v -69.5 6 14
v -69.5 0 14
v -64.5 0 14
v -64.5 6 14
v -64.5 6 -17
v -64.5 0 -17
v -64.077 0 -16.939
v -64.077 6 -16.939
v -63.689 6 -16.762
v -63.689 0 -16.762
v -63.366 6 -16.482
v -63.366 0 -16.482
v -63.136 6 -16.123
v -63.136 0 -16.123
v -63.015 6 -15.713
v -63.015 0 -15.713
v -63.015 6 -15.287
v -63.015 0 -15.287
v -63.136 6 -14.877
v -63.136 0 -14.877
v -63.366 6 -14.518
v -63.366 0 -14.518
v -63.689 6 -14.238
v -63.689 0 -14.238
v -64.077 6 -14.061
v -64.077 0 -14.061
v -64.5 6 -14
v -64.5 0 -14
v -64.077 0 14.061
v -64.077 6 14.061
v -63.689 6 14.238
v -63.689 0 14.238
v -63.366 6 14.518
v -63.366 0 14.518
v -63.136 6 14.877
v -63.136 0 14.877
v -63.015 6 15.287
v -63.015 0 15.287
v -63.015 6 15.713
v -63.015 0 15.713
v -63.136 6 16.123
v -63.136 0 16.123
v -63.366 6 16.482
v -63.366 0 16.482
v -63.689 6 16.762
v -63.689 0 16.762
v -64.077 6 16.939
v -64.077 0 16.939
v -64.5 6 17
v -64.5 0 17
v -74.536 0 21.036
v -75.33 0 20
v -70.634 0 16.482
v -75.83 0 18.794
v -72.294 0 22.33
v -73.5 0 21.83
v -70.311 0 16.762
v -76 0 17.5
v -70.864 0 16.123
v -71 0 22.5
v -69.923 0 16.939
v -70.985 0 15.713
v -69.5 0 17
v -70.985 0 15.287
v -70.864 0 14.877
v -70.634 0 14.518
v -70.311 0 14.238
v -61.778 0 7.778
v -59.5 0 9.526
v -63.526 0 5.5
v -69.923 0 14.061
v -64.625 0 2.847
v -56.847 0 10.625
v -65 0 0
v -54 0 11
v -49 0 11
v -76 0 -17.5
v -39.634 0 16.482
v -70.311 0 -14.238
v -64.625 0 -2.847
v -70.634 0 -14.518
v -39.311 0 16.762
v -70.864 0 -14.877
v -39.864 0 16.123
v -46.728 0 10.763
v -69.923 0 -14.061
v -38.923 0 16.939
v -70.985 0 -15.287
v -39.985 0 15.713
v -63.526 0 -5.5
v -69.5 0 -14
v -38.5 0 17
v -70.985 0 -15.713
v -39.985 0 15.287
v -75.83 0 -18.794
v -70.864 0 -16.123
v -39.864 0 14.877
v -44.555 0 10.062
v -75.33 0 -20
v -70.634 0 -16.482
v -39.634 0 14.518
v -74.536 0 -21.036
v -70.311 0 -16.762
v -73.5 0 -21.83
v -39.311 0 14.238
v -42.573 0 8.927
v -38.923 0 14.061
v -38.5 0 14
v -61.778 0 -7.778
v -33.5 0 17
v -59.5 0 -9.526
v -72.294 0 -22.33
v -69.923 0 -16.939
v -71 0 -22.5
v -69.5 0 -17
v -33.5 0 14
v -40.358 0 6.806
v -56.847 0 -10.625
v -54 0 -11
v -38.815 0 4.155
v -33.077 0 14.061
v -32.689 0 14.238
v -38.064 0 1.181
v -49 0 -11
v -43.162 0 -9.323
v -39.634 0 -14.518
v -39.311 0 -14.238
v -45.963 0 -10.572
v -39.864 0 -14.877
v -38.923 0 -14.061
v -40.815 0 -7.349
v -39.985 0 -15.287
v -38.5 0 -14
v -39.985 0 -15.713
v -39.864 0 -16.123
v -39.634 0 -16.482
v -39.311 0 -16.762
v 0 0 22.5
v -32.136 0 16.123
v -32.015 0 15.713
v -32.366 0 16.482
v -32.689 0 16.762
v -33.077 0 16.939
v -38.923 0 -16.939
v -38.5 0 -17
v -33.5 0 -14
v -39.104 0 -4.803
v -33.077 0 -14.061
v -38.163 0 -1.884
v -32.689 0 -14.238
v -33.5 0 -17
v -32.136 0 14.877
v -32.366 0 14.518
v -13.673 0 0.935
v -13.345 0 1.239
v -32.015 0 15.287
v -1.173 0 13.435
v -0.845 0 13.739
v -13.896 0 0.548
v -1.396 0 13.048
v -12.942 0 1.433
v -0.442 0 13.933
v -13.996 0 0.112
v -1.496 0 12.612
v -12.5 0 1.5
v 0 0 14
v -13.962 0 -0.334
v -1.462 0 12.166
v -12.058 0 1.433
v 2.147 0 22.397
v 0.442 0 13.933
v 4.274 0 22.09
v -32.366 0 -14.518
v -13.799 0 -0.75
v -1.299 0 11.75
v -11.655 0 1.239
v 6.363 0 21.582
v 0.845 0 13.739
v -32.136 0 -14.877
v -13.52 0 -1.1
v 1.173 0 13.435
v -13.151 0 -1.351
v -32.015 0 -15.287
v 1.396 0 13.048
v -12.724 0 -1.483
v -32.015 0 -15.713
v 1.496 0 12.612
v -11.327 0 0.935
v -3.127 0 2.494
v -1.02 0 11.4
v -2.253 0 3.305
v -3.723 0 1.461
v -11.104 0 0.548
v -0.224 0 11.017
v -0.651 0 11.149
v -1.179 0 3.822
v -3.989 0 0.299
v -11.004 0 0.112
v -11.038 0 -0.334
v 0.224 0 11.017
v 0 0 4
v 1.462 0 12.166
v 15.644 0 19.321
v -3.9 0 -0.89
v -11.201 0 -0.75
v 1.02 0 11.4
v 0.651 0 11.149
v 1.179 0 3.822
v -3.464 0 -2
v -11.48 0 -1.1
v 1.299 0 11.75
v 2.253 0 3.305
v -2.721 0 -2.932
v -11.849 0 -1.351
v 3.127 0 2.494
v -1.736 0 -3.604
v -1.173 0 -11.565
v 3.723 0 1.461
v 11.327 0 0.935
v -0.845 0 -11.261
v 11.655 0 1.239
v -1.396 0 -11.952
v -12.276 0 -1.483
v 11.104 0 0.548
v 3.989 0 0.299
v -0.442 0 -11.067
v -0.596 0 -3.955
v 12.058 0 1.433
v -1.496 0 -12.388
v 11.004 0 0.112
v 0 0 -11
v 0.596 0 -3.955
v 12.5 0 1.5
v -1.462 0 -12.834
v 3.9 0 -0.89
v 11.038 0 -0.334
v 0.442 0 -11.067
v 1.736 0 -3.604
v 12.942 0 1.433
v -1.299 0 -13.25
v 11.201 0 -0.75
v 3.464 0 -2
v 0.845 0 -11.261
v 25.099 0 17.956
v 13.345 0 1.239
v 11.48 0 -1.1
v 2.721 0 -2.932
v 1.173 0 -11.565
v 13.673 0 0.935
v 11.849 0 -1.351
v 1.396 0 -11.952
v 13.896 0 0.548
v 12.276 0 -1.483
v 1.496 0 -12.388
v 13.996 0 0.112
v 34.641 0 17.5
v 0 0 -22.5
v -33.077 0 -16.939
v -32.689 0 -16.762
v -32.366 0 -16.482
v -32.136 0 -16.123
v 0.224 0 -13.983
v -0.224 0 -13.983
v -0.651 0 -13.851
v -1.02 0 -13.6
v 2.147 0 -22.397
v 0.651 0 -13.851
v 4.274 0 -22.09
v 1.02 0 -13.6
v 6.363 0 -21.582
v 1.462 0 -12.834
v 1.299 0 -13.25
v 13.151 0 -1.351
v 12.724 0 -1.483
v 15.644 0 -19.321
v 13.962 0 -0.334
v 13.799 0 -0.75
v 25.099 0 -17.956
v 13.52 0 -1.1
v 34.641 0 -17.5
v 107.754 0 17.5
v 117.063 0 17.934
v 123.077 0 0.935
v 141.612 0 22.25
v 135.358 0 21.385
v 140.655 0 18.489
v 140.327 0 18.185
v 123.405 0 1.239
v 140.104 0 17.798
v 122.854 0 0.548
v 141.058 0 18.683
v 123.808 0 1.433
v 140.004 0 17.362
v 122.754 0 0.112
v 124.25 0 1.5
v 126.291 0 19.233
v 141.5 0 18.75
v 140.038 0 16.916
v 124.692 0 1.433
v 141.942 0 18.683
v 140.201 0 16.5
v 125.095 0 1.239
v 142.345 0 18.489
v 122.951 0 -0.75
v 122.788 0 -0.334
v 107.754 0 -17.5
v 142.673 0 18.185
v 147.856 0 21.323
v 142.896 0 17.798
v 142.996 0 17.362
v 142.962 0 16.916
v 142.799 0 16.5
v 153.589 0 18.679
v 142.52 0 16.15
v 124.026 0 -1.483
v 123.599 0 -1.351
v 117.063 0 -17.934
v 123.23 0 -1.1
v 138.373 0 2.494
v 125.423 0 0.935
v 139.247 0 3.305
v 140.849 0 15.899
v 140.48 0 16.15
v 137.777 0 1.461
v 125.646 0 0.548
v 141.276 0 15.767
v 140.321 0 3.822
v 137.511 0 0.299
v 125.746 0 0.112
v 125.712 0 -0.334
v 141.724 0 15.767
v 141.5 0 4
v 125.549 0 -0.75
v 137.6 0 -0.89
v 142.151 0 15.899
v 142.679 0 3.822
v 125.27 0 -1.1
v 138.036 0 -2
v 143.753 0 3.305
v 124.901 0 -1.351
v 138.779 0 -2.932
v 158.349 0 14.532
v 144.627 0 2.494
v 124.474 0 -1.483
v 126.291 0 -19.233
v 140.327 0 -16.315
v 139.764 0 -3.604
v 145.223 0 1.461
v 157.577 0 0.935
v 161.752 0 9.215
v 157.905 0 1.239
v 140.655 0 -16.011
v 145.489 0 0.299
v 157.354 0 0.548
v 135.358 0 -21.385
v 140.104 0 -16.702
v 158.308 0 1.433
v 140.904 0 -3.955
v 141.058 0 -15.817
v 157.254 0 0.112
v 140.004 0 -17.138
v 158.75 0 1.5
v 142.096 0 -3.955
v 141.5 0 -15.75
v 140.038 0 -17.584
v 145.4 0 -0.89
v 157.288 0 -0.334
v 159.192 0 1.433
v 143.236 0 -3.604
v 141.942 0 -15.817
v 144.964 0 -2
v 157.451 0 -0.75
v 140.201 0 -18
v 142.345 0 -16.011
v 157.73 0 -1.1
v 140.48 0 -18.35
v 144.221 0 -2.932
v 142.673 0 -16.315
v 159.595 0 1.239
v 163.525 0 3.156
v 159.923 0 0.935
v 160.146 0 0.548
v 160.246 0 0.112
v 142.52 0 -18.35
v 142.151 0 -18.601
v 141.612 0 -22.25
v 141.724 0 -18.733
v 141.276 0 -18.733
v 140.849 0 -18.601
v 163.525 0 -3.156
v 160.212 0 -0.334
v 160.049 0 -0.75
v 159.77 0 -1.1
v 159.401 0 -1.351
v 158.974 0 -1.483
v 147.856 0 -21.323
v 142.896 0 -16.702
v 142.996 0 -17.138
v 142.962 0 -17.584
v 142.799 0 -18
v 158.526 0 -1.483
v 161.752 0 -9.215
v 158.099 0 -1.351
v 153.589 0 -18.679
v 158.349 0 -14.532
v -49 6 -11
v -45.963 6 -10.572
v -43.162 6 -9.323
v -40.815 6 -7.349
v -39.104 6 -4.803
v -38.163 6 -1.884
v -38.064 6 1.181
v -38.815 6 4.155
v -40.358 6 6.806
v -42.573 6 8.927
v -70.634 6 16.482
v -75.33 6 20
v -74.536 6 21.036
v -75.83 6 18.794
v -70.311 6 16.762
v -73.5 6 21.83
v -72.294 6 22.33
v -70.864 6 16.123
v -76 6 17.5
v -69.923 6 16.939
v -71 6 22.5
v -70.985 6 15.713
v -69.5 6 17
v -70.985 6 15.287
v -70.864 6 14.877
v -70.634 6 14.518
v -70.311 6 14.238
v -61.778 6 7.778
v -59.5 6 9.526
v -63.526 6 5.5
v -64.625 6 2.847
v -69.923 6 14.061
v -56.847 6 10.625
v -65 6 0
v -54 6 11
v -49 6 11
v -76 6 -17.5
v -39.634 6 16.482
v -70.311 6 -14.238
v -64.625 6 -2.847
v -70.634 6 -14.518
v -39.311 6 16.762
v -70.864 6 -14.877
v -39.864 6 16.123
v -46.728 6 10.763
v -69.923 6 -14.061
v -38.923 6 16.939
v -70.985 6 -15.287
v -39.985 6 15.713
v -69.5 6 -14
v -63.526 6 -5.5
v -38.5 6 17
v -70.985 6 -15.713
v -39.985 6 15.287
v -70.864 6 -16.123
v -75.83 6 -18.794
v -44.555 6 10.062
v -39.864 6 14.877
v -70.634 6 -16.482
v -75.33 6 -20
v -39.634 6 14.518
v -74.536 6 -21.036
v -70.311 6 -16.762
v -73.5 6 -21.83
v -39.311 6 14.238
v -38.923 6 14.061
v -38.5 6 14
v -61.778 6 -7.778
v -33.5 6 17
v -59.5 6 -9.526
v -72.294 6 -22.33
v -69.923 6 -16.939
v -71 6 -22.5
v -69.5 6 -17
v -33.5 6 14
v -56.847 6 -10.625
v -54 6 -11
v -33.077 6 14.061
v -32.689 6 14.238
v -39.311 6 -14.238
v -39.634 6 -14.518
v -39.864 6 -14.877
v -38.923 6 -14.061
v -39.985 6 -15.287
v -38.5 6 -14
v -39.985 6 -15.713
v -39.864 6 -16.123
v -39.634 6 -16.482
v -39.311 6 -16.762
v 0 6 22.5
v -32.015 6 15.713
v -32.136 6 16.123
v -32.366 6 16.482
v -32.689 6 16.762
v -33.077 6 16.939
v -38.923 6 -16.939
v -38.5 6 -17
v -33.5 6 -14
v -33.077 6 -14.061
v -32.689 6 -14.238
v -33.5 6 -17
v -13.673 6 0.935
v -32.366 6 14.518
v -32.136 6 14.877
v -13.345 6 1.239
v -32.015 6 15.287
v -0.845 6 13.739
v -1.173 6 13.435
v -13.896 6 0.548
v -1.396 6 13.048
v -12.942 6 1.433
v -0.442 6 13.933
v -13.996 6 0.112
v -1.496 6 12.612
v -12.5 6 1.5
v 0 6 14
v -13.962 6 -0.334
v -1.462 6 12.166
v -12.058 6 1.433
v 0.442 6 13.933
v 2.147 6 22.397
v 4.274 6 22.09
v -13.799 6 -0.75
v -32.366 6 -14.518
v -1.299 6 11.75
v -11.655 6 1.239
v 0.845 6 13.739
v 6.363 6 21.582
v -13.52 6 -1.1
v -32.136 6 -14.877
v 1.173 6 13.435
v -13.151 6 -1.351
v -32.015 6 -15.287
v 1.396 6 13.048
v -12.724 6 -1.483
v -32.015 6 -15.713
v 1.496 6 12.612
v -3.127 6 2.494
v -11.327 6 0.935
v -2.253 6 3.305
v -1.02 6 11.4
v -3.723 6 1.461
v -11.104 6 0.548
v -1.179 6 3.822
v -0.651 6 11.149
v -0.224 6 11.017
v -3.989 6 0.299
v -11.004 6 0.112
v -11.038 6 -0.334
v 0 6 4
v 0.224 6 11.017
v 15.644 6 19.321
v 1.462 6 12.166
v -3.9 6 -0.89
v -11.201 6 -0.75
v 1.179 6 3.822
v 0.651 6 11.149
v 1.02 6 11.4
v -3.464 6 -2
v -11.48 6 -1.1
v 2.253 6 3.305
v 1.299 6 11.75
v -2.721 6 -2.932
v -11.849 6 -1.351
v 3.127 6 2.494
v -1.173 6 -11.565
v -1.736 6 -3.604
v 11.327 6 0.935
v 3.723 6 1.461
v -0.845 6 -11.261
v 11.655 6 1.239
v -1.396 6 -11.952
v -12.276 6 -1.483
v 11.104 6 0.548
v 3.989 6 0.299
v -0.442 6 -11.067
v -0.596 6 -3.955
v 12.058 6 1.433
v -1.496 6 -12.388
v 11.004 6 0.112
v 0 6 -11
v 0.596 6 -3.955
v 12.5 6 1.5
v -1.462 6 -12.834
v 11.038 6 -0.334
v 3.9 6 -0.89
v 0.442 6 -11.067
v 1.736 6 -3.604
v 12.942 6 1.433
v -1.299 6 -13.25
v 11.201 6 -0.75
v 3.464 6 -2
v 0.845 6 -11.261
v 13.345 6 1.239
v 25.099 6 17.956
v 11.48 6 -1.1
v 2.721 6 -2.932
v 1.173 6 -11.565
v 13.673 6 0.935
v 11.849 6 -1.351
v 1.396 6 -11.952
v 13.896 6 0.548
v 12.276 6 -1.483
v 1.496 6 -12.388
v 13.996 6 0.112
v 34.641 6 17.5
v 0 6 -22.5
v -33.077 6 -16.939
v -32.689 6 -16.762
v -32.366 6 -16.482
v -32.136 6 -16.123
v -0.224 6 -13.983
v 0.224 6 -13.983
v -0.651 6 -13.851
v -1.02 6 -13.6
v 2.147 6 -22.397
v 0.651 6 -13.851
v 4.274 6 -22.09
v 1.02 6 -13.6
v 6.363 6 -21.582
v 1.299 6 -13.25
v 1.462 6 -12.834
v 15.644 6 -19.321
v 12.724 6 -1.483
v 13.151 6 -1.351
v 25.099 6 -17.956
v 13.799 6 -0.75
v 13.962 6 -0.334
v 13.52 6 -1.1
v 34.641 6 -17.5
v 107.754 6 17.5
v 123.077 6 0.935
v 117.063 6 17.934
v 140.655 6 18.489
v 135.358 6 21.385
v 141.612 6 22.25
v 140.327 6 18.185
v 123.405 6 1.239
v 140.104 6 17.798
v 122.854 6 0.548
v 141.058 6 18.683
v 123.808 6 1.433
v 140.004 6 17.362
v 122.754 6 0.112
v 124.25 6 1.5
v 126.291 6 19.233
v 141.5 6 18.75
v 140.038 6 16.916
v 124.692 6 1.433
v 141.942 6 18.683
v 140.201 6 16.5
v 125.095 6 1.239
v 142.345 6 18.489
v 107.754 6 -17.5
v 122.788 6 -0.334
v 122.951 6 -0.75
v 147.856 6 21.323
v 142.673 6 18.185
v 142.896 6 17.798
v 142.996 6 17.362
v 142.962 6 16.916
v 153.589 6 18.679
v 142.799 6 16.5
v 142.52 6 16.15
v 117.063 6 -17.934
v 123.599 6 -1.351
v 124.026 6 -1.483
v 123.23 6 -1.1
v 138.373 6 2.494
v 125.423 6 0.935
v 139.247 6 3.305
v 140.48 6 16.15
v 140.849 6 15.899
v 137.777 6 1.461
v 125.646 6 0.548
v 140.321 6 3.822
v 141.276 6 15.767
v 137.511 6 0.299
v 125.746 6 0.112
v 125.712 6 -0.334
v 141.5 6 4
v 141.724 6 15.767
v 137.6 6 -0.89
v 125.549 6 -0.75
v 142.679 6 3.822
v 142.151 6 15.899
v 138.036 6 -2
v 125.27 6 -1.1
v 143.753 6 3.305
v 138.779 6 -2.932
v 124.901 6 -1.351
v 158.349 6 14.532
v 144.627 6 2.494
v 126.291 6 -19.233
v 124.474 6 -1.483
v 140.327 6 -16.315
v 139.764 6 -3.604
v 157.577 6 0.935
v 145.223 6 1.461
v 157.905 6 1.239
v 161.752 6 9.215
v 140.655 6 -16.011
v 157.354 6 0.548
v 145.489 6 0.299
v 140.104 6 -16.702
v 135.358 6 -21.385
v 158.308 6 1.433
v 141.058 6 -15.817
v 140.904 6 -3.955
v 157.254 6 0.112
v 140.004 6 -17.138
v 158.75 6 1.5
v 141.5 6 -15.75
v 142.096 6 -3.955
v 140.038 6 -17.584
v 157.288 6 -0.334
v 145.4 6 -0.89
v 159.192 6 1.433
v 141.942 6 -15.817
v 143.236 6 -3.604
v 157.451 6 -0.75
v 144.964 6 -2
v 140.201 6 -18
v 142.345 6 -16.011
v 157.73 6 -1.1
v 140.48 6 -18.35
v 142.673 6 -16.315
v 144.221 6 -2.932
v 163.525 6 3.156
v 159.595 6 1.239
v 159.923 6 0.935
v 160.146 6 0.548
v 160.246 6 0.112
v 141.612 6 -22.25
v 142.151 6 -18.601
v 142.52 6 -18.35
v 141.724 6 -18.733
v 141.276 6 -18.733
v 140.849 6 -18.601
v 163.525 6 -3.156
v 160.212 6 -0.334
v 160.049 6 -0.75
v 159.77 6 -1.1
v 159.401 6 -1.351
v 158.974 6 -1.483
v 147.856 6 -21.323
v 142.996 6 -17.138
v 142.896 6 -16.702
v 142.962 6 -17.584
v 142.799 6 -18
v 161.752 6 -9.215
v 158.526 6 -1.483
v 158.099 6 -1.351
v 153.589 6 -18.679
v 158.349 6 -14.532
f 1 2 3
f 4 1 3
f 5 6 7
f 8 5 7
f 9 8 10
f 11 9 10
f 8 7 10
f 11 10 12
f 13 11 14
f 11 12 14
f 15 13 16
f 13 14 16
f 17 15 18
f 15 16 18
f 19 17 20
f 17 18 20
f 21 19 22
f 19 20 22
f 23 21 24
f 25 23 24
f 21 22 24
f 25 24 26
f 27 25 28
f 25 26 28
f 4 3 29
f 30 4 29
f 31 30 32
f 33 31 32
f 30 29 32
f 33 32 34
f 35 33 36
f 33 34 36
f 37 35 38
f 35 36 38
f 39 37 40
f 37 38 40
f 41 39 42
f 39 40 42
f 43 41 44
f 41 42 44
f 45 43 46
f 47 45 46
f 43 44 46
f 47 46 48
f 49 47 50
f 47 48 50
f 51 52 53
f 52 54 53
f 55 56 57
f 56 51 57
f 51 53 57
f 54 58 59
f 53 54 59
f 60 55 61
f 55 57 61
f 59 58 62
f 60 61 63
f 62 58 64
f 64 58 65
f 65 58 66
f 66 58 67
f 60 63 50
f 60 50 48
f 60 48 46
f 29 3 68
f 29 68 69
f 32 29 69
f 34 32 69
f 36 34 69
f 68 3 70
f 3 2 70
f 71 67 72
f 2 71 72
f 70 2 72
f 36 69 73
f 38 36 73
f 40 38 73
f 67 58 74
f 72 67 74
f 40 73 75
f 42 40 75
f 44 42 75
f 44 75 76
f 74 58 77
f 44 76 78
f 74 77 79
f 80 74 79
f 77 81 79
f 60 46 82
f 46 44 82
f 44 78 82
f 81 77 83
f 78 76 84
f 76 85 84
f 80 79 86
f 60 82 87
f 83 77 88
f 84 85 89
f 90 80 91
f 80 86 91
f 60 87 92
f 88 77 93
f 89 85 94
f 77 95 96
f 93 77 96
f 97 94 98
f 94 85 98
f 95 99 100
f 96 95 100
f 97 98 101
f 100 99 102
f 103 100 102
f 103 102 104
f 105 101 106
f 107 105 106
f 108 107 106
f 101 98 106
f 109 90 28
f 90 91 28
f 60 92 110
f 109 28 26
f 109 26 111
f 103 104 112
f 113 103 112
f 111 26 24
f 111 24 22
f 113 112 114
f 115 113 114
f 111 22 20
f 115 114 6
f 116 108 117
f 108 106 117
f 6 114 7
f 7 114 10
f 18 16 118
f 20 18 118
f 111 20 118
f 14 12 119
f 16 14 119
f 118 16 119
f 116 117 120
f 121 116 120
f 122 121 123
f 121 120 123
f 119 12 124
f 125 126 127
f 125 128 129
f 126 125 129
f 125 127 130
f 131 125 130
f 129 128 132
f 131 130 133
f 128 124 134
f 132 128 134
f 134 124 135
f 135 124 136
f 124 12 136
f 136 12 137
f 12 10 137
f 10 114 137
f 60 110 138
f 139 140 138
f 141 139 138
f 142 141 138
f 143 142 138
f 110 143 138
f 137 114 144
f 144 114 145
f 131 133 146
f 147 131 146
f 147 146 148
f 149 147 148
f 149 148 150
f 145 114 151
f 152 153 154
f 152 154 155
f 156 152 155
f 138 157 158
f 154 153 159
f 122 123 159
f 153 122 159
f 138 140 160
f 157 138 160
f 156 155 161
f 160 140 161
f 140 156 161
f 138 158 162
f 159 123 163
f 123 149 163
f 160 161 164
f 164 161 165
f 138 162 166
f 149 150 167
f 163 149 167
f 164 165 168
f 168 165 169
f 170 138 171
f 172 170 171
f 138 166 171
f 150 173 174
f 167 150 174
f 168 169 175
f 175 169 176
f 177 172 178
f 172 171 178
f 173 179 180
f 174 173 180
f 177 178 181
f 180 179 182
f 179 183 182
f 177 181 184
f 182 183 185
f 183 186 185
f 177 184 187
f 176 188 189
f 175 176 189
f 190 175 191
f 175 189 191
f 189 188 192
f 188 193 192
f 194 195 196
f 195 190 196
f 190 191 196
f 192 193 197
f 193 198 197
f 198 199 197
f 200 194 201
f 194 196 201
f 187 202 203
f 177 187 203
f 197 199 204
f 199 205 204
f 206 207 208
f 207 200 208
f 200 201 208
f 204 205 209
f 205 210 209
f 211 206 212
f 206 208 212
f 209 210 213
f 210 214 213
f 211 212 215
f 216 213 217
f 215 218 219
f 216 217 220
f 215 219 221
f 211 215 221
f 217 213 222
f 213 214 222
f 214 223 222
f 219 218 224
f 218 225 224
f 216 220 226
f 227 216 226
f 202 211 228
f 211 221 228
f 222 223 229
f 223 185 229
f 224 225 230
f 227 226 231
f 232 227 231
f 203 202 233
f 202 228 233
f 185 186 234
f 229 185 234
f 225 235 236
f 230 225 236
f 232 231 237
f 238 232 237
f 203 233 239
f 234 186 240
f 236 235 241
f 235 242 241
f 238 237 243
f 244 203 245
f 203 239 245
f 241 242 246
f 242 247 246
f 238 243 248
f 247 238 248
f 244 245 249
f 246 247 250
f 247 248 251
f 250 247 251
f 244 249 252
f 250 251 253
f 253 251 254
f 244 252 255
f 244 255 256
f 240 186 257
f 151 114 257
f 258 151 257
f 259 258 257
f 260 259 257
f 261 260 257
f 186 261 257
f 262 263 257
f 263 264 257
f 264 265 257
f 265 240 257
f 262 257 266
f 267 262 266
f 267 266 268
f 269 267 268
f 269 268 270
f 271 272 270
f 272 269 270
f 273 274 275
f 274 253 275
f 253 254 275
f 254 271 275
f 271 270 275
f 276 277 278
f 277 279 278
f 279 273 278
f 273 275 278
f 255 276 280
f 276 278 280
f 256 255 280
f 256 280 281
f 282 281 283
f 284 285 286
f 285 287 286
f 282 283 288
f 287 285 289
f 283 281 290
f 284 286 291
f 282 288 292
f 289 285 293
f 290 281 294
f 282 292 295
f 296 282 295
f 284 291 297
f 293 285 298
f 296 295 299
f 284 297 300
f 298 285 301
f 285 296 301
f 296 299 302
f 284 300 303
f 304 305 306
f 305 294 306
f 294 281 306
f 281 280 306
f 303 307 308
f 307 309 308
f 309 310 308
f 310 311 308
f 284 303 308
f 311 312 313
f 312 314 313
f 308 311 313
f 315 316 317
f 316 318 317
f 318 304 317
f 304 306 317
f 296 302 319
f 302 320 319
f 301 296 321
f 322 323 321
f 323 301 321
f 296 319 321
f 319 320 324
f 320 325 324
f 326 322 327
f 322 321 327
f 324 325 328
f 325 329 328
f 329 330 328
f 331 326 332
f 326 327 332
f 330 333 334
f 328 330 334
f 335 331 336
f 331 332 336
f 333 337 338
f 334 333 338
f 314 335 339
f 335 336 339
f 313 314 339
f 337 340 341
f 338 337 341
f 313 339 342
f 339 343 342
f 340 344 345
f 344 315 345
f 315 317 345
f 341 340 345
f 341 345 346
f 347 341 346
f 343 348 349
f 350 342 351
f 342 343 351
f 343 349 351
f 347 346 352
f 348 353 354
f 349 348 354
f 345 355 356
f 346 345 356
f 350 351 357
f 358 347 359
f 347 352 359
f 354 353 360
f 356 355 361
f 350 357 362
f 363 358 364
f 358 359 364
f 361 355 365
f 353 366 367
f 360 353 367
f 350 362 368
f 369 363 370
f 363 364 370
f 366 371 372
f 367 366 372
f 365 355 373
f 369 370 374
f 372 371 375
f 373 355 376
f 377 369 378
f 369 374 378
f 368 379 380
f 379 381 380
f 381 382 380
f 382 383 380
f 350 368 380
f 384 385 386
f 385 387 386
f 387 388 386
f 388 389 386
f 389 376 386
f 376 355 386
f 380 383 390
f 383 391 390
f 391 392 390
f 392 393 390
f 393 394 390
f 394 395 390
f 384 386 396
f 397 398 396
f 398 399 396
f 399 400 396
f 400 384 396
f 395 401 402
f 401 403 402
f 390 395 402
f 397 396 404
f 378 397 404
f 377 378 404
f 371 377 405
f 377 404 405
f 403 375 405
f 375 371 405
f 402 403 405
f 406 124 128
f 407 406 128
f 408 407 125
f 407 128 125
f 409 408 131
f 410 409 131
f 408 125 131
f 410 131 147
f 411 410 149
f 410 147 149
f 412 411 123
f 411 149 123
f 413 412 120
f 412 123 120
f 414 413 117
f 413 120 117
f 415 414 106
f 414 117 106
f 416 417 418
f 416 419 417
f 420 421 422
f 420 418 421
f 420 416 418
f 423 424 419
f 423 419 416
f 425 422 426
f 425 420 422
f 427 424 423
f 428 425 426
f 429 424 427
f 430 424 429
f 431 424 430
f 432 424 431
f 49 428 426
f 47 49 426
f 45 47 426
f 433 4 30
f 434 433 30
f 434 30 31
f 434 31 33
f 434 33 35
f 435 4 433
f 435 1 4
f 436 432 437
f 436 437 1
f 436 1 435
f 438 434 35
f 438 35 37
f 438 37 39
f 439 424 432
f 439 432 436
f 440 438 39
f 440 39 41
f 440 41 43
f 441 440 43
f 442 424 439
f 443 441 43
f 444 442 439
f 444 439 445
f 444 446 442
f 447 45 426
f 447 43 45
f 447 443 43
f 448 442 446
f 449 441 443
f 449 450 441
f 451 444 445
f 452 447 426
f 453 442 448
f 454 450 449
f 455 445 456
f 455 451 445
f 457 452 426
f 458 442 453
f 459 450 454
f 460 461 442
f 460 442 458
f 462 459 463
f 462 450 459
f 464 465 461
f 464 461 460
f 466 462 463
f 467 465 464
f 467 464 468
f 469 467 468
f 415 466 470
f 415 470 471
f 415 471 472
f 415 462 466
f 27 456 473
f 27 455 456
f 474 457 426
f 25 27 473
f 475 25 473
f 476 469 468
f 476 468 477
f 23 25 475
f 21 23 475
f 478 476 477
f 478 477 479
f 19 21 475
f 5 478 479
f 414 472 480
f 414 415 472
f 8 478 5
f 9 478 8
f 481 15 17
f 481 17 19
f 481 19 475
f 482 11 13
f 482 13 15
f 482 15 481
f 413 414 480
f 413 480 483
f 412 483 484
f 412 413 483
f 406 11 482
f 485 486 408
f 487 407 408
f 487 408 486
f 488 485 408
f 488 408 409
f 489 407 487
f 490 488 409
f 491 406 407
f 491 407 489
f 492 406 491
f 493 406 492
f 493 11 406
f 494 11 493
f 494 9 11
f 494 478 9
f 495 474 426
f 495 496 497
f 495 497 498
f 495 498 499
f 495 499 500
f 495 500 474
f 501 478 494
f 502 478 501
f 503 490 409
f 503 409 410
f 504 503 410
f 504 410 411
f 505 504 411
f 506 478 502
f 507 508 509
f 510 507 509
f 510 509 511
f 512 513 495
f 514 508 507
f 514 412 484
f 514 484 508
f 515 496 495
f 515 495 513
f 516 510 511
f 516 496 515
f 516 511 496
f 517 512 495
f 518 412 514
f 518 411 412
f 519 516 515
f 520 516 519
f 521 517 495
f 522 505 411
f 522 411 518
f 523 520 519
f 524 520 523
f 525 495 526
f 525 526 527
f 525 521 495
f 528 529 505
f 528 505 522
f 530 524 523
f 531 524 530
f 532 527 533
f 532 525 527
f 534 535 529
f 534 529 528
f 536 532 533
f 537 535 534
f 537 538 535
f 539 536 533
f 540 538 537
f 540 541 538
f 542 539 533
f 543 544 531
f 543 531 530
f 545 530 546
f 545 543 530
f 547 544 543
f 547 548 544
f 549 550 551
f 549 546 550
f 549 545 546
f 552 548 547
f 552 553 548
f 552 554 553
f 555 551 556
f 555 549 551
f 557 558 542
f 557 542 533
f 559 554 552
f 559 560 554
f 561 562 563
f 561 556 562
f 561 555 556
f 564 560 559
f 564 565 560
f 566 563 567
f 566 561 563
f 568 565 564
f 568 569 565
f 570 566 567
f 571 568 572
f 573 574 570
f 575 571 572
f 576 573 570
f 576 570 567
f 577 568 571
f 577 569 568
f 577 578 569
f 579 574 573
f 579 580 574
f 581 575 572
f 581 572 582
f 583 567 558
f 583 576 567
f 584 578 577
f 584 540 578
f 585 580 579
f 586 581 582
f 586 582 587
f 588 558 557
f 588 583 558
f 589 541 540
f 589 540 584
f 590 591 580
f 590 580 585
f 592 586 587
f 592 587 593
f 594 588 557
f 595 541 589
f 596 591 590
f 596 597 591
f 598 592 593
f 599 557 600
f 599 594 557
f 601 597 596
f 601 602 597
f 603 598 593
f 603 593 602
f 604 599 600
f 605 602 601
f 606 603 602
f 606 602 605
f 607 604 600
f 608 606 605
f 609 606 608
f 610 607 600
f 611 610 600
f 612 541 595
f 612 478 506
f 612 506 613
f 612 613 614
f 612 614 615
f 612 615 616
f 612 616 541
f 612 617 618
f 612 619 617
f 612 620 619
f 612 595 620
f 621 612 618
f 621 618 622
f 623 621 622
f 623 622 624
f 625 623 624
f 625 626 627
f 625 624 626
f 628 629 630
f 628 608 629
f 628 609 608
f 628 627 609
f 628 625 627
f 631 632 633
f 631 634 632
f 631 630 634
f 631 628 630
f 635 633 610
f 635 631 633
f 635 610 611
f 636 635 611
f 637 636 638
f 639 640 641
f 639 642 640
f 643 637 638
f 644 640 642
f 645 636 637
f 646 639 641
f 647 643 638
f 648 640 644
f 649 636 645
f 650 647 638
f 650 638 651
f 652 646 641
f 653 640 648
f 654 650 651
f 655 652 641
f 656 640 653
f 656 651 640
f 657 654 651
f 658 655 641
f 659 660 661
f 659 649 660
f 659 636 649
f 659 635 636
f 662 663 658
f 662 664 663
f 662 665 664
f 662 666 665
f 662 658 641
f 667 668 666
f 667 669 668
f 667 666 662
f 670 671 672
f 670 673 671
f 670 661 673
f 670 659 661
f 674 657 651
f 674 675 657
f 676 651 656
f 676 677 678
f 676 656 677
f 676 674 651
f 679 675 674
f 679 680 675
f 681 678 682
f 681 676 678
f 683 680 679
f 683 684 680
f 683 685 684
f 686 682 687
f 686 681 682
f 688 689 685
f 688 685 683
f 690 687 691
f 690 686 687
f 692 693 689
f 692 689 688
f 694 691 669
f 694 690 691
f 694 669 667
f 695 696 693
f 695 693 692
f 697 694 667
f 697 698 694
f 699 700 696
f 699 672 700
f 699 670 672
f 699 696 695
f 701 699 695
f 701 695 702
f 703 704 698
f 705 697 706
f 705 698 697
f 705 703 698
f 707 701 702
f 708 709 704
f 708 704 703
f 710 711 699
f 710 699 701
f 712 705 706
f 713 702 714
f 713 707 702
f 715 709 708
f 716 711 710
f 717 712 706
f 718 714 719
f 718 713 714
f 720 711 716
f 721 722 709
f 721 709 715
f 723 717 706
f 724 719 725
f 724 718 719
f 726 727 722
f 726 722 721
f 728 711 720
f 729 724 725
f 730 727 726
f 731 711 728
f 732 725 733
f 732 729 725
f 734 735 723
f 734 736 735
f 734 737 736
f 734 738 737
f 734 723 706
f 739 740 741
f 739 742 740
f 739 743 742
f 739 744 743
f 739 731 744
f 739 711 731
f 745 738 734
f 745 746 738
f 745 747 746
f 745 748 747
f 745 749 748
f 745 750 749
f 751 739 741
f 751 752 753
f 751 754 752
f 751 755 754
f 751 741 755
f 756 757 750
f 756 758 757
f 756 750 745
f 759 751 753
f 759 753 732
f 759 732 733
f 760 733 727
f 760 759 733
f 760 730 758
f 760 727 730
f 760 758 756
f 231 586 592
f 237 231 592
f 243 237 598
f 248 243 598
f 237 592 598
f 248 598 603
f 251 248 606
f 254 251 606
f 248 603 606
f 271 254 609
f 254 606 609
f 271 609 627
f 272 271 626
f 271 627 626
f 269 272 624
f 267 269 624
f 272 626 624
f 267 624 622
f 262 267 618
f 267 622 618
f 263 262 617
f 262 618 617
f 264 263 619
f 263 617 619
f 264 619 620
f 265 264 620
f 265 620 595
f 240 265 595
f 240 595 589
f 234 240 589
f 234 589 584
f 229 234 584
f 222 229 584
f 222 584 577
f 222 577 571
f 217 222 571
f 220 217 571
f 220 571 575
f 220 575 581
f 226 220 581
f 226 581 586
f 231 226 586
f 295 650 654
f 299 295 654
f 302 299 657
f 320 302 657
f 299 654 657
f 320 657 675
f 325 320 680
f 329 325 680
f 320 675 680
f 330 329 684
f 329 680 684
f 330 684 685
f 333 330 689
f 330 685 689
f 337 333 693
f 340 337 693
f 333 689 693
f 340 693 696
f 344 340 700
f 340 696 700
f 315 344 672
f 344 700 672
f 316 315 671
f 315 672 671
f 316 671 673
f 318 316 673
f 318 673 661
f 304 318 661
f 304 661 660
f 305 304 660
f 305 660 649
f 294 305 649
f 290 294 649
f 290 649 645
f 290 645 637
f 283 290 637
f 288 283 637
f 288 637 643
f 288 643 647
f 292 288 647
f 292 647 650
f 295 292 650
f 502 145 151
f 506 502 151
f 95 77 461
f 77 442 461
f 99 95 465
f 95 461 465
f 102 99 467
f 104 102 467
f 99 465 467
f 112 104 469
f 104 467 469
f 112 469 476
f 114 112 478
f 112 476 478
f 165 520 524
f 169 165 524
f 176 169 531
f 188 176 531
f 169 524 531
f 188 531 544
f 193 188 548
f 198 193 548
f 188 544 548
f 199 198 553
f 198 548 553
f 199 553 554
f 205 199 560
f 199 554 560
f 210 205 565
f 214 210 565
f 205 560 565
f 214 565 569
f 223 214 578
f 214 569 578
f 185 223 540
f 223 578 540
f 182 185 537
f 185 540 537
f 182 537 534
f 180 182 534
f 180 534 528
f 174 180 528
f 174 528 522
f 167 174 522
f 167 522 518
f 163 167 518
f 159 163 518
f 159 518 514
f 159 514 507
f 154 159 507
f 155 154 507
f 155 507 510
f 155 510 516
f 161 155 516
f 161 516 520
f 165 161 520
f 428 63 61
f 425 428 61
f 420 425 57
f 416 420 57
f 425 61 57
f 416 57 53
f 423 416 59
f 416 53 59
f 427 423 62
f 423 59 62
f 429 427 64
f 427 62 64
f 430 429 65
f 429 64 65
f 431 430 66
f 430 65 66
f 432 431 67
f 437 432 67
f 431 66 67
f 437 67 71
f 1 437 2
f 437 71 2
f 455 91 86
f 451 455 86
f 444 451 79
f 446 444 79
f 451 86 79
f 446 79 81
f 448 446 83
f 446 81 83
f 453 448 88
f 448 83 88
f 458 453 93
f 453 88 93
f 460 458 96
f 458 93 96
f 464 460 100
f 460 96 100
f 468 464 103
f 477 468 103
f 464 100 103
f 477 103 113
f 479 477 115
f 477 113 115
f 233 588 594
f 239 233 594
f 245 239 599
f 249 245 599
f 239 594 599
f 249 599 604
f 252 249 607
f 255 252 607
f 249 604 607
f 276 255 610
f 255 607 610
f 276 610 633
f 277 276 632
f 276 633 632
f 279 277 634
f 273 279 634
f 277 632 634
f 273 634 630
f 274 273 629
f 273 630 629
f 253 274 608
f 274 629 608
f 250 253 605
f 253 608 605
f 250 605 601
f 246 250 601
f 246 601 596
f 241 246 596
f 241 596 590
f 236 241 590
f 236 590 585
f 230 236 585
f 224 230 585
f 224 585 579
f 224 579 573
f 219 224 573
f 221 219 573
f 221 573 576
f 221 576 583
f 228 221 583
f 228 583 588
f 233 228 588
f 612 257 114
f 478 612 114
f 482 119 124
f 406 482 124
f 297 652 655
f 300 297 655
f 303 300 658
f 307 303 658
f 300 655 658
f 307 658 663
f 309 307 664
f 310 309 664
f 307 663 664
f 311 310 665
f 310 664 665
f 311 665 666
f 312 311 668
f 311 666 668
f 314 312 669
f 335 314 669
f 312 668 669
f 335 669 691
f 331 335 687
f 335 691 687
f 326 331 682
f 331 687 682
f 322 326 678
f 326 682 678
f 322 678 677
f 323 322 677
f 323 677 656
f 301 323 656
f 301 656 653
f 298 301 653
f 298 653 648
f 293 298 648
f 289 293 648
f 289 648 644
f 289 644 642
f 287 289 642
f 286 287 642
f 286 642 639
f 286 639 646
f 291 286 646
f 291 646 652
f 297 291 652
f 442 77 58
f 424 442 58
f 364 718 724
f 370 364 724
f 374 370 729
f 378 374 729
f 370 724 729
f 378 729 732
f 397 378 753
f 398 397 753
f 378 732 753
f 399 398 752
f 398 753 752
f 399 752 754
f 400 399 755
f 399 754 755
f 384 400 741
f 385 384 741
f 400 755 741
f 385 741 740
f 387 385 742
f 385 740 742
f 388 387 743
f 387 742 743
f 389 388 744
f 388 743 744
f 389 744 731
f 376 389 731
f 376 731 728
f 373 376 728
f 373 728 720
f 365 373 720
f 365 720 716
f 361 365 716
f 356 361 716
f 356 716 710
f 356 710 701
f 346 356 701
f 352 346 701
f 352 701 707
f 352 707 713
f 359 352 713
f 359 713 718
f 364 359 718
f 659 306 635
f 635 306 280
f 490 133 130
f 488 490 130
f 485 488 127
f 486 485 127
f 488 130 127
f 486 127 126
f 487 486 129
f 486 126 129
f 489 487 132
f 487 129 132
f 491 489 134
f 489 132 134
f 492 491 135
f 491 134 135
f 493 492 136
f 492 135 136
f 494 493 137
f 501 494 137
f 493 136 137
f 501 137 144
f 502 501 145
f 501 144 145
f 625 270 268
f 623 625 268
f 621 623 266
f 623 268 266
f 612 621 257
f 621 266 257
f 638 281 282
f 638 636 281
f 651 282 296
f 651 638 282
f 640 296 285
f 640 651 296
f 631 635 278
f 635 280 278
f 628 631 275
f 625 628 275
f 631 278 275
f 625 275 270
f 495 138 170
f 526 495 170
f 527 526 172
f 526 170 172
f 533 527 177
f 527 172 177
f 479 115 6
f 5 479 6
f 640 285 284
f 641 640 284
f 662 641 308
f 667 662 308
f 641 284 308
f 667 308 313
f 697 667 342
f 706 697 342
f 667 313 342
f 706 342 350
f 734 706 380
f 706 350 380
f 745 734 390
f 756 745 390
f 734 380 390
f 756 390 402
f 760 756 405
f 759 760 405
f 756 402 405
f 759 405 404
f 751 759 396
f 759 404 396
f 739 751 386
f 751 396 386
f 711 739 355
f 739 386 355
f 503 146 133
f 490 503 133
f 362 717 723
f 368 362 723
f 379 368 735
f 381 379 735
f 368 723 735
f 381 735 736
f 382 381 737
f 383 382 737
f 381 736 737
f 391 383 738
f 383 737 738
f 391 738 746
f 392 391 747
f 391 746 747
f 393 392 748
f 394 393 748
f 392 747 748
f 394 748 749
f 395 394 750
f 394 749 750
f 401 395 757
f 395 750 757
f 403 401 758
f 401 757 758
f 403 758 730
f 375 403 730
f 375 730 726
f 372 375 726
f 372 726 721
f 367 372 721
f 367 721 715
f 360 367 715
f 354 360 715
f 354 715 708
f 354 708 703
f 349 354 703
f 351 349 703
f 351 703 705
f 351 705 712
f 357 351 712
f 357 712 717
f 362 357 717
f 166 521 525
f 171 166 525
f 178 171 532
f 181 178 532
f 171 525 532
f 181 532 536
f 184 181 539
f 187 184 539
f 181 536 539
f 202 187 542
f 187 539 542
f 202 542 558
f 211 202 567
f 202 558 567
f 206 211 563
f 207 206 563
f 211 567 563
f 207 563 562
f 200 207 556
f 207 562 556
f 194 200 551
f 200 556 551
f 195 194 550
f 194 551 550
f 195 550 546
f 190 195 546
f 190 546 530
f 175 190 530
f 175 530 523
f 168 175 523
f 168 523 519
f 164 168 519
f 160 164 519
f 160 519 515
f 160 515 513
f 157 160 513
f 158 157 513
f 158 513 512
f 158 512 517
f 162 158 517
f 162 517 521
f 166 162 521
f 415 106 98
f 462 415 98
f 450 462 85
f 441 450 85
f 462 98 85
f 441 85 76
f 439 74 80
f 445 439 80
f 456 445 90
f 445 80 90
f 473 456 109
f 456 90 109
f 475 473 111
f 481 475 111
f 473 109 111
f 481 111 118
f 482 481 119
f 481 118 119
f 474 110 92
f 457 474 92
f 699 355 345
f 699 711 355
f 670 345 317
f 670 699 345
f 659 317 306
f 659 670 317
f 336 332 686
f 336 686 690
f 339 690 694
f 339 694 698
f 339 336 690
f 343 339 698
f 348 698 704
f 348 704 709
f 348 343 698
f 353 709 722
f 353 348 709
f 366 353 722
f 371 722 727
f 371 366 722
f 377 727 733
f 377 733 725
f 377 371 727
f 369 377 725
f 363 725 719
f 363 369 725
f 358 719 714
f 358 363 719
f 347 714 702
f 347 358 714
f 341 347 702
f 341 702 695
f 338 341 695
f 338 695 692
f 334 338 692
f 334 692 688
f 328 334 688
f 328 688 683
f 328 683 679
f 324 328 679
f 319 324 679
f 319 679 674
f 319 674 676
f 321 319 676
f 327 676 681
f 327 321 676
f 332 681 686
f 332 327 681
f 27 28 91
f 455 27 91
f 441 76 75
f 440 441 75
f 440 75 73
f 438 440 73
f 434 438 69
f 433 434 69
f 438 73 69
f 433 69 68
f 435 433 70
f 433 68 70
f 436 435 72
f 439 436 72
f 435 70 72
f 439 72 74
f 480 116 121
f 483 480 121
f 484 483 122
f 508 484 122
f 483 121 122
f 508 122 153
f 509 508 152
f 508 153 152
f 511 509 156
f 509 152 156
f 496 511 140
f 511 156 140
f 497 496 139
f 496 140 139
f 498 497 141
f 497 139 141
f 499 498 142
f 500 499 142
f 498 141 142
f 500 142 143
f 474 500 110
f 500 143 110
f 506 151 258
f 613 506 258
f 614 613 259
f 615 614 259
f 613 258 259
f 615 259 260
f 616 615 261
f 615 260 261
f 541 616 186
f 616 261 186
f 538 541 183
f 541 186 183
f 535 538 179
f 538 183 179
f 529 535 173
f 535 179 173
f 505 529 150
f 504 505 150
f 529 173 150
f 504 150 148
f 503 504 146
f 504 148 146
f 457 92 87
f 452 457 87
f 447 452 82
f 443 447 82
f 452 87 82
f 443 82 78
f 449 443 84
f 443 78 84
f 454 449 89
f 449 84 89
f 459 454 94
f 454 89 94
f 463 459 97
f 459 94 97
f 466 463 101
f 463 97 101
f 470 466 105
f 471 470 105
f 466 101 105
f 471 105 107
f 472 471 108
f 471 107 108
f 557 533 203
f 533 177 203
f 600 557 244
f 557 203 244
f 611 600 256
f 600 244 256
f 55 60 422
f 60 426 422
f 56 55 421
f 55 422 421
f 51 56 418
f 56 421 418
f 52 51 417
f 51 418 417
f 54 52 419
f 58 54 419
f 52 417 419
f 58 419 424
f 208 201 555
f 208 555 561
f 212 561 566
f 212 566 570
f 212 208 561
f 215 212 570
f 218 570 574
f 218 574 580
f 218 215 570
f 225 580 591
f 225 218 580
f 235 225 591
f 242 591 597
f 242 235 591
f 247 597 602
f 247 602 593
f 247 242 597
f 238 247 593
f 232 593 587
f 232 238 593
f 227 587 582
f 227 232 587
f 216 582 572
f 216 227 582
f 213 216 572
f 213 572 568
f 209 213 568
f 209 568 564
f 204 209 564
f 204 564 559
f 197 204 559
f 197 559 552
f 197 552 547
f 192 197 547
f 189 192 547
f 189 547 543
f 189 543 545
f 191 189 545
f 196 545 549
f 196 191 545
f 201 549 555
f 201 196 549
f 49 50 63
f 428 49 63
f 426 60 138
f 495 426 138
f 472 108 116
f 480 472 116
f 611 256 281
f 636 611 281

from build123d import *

# Parameters (mm, degrees)
SKETCH1_R           = 4
BOSS_EXTRUDE1_DEPTH = 6
BOSS_EXTRUDE2_START = -6
SKETCH2_R           = 4
BOSS_EXTRUDE2_DEPTH = 6
FILLET1_R           = 5
SKETCH3_R           = 1.5
CUT_EXTRUDE1_DEPTH  = 19
SKETCH4_R           = 1.5
CUT_EXTRUDE2_DEPTH  = 19
FILLET2_R           = 100


with BuildPart() as part:
    # Sketch1 → Boss-Extrude1 (new body)
    with BuildSketch(Plane(origin=(0, 0, 0), x_dir=(1, 0, 0), z_dir=(0, 1, 0))):
        with BuildLine():
            Line((0, -17.5), (127.759093916, -17.5))
            ThreePointArc((127.759093916, -17.5), (163.75, 0), (127.759093916, 17.5))
            Line((127.759093916, 17.5), (0, 17.5))
            ThreePointArc((0, 17.5), (-17.5, 0), (0, -17.5))
        make_face()
        with Locations(Location((141.5, 0, 0), (0, 0, 270))):
            Circle(SKETCH1_R, mode=Mode.SUBTRACT)
        with Locations(Location((0, 0, 0), (0, 0, 270))):
            Circle(SKETCH1_R, mode=Mode.SUBTRACT)
    extrude(amount=BOSS_EXTRUDE1_DEPTH)

    # Sketch2 → Boss-Extrude2 (add)
    with BuildSketch(Plane(origin=(0, 6, 0), x_dir=(1, 0, 0), z_dir=(0, 1, 0)).offset(BOSS_EXTRUDE2_START)):
        with BuildLine():
            ThreePointArc((0, -22.5), (22.5, 0), (0, 22.5))
            Line((0, 22.5), (-76, 22.5))
            Line((-76, 22.5), (-76, -22.5))
            Line((-76, -22.5), (0, -22.5))
        make_face()
        with BuildLine():
            Line((-64.5, -17), (-69.5, -17))
            ThreePointArc((-69.5, -17), (-71, -15.5), (-69.5, -14))
            Line((-69.5, -14), (-64.5, -14))
            ThreePointArc((-64.5, -14), (-63, -15.5), (-64.5, -17))
        make_face(mode=Mode.SUBTRACT)
        with BuildLine():
            Line((-38.5, -14), (-37.5, -14))
            Line((-37.5, -14), (-33.5, -14))
            ThreePointArc((-33.5, -14), (-32, -15.5), (-33.5, -17))
            Line((-33.5, -17), (-38.5, -17))
            ThreePointArc((-38.5, -17), (-40, -15.5), (-38.5, -14))
        make_face(mode=Mode.SUBTRACT)
        with BuildLine():
            ThreePointArc((-49, 11), (-38.531049744, 3.376548613), (-42.572923734, -8.927076266))
            ThreePointArc((-42.572923734, -8.927076266), (-45.623451387, -10.468950256), (-49, -11))
            Line((-49, -11), (-54, -11))
            ThreePointArc((-54, -11), (-61.778174593, -7.778174593), (-65, 0))
            ThreePointArc((-65, 0), (-61.778174593, 7.778174593), (-54, 11))
            Line((-54, 11), (-49, 11))
        make_face(mode=Mode.SUBTRACT)
        with BuildLine():
            ThreePointArc((-64.5, 17), (-63, 15.5), (-64.5, 14))
            Line((-64.5, 14), (-69.5, 14))
            ThreePointArc((-69.5, 14), (-71, 15.5), (-69.5, 17))
            Line((-69.5, 17), (-64.5, 17))
        make_face(mode=Mode.SUBTRACT)
        with BuildLine():
            ThreePointArc((-33.5, 17), (-32, 15.5), (-33.5, 14))
            Line((-33.5, 14), (-38.5, 14))
            ThreePointArc((-38.5, 14), (-40, 15.5), (-38.5, 17))
            Line((-38.5, 17), (-33.5, 17))
        make_face(mode=Mode.SUBTRACT)
        with Locations(Location((0, 0, 0), (0, 0, 270))):
            Circle(SKETCH2_R, mode=Mode.SUBTRACT)
    extrude(amount=BOSS_EXTRUDE2_DEPTH)

    # Fillet1
    fillet1_edges = [part.edges().sort_by_distance(p)[0] for p in [
        (-76, 3, 22.5),
        (-76, 3, -22.5),
    ]]
    fillet(fillet1_edges, radius=FILLET1_R)

    # Sketch3 → Cut-Extrude1 (cut)
    with BuildSketch(Plane(origin=(0, 6, 0), x_dir=(1, 0, 0), z_dir=(0, 1, 0))):
        with Locations(Location((0, 12.5, 0), (0, 0, 270))):
            Circle(SKETCH3_R)
        with Locations(Location((12.5, 0, 0), (0, 0, 270))):
            Circle(SKETCH3_R)
        with Locations(Location((0, -12.5, 0), (0, 0, 270))):
            Circle(SKETCH3_R)
        with Locations(Location((-12.5, 0, 0), (0, 0, 270))):
            Circle(SKETCH3_R)
    extrude(amount=-CUT_EXTRUDE1_DEPTH, mode=Mode.SUBTRACT)

    # Sketch4 → Cut-Extrude2 (cut)
    with BuildSketch(Plane(origin=(0, 6, 0), x_dir=(1, 0, 0), z_dir=(0, 1, 0))):
        with Locations(Location((158.75, 0, 0), (0, 0, 270))):
            Circle(SKETCH4_R)
        with Locations(Location((141.5, -17.25, 0), (0, 0, 270))):
            Circle(SKETCH4_R)
        with Locations(Location((124.25, 0, 0), (0, 0, 270))):
            Circle(SKETCH4_R)
        with Locations(Location((141.5, 17.25, 0), (0, 0, 270))):
            Circle(SKETCH4_R)
    extrude(amount=-CUT_EXTRUDE2_DEPTH, mode=Mode.SUBTRACT)

    # Fillet2
    fillet2_edges = [part.edges().sort_by_distance(p)[0] for p in [
        (127.759093916, 3, -17.5),
        (127.759093916, 3, 17.5),
        (14.142135624, 3, -17.5),
        (14.142135624, 3, 17.5),
    ]]
    fillet(fillet2_edges, radius=FILLET2_R)


solid = part.part
